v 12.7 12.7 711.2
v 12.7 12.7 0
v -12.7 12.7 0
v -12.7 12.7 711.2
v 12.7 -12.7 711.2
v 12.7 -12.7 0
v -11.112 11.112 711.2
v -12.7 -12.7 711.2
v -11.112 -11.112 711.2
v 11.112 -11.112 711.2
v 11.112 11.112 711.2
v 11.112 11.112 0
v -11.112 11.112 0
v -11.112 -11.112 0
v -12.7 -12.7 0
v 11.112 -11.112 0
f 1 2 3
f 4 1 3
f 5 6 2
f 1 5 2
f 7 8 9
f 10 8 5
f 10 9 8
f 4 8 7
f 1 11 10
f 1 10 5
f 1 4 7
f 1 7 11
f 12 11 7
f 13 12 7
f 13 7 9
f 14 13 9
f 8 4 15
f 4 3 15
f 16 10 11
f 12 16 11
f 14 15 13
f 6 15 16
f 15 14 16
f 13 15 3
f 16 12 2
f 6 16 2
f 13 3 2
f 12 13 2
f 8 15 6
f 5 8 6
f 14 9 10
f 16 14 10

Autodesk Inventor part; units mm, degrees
ref_plane "YZ Plane" through (0, 0, 0) normal (1, 0, 0) x (0, 1, 0)
ref_plane "XZ Plane" through (0, 0, 0) normal (0, 1, 0) x (-1, 0, 0)
ref_plane "XY Plane" through (0, 0, 0) normal (0, 0, 1) x (1, 0, 0)
sketch "Sketch1" plane through (0, 0, 0) normal (0, 0, 1) x (1, 0, 0)
  line L0 (-12.7, -12.7) -> (12.7, -12.7)
  line L1 (12.7, -12.7) -> (12.7, 12.7)
  line L2 (12.7, 12.7) -> (-12.7, 12.7)
  line L3 (-12.7, 12.7) -> (-12.7, -12.7)
  line L4 (-11.1125, -11.1125) -> (11.1125, -11.1125)
  line L5 (11.1125, -11.1125) -> (11.1125, 11.1125)
  line L6 (11.1125, 11.1125) -> (-11.1125, 11.1125)
  line L7 (-11.1125, 11.1125) -> (-11.1125, -11.1125)
  point P0 (0, 0)
  dimension "d0" = 25.4
  dimension "d1" = 25.4
  dimension "d2" = 22.225
  dimension "d3" = 22.225
extrude "Extrusion1" add sketch "Sketch1" along normal blind 711.2
equation "\"BendRadius\" = Thickness"
equation "\"BendReliefWidth\" = Thickness"
equation "\"BendReliefDepth\" = 0.5 * Thickness"
equation "\"CornerReliefSize\" = 4 * Thickness"
equation "\"MinimumRemnant\" = 2 * Thickness"
equation "\"TransitionRadius\" = BendRadius"
equation "\"JacobiRadiusSize\" = BendRadius"
equation "\"GapSize\" = Thickness"
equation "\"Thickness\" = 3.048"
properties part number "28 in 1-16"
